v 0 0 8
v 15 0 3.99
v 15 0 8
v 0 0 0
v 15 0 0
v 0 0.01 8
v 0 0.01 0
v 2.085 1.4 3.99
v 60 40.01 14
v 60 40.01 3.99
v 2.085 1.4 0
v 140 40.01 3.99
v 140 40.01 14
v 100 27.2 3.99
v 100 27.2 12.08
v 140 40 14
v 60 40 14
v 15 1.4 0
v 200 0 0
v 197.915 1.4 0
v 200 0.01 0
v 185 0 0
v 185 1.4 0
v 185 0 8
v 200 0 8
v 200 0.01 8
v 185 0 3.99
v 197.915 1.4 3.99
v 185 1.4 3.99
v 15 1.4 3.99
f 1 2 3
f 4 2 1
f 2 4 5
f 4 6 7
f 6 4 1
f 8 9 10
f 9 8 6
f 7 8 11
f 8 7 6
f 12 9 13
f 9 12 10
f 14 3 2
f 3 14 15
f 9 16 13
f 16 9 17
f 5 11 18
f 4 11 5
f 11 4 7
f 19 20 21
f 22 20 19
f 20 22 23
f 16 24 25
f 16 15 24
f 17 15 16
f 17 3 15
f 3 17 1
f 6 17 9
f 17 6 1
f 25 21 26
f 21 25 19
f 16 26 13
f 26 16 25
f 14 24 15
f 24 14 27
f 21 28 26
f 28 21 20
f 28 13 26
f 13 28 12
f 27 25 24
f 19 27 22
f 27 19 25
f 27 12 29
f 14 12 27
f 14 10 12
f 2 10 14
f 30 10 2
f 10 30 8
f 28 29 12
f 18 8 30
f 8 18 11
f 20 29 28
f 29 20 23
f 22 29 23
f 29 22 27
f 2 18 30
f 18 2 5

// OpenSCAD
// file: libs/rounded_shapes.scad
$fa = 1;
$fs = 1.75 / 2;

module rounded_square(width, height, border_radius) {
    translate([border_radius, border_radius])
    minkowski() {
        border_diameter = border_radius * 2;

        square(
            size = [
                width - border_diameter,
                height - border_diameter
            ]
        );
        circle(r = border_radius);
    }
}
// main file
include<libs/rounded_shapes.scad>;

$fa = 1;
$fs = 1.75 / 2;

outer_width = 200;
outer_height = 40;

head_width = 80;
head_height = 10;

foot_width = 15;
foot_height = 4;

tab_thickness = 1.4;
tab_height = 4;

difference() {
    union() {
        hull() {
            translate([outer_width / 2 - head_width / 2, outer_height])
            cube([head_width, 0.01, head_height + tab_height]);

            cube([foot_width, 0.01, foot_height + tab_height]);
        }

        hull() {
            translate([outer_width / 2 - head_width / 2, outer_height])
            cube([head_width, 0.01, head_height + tab_height]);

            translate([outer_width - foot_width, 0, 0])
            cube([foot_width, 0.01, foot_height + tab_height]);
        }
    }

    union() {
        translate([0, tab_thickness, -0.01])
        cube([outer_width, outer_height, tab_height]);

        translate([foot_width, 0, -0.01])
        cube([outer_width - foot_width * 2, tab_thickness + 0.01, tab_height]);
    }
}
